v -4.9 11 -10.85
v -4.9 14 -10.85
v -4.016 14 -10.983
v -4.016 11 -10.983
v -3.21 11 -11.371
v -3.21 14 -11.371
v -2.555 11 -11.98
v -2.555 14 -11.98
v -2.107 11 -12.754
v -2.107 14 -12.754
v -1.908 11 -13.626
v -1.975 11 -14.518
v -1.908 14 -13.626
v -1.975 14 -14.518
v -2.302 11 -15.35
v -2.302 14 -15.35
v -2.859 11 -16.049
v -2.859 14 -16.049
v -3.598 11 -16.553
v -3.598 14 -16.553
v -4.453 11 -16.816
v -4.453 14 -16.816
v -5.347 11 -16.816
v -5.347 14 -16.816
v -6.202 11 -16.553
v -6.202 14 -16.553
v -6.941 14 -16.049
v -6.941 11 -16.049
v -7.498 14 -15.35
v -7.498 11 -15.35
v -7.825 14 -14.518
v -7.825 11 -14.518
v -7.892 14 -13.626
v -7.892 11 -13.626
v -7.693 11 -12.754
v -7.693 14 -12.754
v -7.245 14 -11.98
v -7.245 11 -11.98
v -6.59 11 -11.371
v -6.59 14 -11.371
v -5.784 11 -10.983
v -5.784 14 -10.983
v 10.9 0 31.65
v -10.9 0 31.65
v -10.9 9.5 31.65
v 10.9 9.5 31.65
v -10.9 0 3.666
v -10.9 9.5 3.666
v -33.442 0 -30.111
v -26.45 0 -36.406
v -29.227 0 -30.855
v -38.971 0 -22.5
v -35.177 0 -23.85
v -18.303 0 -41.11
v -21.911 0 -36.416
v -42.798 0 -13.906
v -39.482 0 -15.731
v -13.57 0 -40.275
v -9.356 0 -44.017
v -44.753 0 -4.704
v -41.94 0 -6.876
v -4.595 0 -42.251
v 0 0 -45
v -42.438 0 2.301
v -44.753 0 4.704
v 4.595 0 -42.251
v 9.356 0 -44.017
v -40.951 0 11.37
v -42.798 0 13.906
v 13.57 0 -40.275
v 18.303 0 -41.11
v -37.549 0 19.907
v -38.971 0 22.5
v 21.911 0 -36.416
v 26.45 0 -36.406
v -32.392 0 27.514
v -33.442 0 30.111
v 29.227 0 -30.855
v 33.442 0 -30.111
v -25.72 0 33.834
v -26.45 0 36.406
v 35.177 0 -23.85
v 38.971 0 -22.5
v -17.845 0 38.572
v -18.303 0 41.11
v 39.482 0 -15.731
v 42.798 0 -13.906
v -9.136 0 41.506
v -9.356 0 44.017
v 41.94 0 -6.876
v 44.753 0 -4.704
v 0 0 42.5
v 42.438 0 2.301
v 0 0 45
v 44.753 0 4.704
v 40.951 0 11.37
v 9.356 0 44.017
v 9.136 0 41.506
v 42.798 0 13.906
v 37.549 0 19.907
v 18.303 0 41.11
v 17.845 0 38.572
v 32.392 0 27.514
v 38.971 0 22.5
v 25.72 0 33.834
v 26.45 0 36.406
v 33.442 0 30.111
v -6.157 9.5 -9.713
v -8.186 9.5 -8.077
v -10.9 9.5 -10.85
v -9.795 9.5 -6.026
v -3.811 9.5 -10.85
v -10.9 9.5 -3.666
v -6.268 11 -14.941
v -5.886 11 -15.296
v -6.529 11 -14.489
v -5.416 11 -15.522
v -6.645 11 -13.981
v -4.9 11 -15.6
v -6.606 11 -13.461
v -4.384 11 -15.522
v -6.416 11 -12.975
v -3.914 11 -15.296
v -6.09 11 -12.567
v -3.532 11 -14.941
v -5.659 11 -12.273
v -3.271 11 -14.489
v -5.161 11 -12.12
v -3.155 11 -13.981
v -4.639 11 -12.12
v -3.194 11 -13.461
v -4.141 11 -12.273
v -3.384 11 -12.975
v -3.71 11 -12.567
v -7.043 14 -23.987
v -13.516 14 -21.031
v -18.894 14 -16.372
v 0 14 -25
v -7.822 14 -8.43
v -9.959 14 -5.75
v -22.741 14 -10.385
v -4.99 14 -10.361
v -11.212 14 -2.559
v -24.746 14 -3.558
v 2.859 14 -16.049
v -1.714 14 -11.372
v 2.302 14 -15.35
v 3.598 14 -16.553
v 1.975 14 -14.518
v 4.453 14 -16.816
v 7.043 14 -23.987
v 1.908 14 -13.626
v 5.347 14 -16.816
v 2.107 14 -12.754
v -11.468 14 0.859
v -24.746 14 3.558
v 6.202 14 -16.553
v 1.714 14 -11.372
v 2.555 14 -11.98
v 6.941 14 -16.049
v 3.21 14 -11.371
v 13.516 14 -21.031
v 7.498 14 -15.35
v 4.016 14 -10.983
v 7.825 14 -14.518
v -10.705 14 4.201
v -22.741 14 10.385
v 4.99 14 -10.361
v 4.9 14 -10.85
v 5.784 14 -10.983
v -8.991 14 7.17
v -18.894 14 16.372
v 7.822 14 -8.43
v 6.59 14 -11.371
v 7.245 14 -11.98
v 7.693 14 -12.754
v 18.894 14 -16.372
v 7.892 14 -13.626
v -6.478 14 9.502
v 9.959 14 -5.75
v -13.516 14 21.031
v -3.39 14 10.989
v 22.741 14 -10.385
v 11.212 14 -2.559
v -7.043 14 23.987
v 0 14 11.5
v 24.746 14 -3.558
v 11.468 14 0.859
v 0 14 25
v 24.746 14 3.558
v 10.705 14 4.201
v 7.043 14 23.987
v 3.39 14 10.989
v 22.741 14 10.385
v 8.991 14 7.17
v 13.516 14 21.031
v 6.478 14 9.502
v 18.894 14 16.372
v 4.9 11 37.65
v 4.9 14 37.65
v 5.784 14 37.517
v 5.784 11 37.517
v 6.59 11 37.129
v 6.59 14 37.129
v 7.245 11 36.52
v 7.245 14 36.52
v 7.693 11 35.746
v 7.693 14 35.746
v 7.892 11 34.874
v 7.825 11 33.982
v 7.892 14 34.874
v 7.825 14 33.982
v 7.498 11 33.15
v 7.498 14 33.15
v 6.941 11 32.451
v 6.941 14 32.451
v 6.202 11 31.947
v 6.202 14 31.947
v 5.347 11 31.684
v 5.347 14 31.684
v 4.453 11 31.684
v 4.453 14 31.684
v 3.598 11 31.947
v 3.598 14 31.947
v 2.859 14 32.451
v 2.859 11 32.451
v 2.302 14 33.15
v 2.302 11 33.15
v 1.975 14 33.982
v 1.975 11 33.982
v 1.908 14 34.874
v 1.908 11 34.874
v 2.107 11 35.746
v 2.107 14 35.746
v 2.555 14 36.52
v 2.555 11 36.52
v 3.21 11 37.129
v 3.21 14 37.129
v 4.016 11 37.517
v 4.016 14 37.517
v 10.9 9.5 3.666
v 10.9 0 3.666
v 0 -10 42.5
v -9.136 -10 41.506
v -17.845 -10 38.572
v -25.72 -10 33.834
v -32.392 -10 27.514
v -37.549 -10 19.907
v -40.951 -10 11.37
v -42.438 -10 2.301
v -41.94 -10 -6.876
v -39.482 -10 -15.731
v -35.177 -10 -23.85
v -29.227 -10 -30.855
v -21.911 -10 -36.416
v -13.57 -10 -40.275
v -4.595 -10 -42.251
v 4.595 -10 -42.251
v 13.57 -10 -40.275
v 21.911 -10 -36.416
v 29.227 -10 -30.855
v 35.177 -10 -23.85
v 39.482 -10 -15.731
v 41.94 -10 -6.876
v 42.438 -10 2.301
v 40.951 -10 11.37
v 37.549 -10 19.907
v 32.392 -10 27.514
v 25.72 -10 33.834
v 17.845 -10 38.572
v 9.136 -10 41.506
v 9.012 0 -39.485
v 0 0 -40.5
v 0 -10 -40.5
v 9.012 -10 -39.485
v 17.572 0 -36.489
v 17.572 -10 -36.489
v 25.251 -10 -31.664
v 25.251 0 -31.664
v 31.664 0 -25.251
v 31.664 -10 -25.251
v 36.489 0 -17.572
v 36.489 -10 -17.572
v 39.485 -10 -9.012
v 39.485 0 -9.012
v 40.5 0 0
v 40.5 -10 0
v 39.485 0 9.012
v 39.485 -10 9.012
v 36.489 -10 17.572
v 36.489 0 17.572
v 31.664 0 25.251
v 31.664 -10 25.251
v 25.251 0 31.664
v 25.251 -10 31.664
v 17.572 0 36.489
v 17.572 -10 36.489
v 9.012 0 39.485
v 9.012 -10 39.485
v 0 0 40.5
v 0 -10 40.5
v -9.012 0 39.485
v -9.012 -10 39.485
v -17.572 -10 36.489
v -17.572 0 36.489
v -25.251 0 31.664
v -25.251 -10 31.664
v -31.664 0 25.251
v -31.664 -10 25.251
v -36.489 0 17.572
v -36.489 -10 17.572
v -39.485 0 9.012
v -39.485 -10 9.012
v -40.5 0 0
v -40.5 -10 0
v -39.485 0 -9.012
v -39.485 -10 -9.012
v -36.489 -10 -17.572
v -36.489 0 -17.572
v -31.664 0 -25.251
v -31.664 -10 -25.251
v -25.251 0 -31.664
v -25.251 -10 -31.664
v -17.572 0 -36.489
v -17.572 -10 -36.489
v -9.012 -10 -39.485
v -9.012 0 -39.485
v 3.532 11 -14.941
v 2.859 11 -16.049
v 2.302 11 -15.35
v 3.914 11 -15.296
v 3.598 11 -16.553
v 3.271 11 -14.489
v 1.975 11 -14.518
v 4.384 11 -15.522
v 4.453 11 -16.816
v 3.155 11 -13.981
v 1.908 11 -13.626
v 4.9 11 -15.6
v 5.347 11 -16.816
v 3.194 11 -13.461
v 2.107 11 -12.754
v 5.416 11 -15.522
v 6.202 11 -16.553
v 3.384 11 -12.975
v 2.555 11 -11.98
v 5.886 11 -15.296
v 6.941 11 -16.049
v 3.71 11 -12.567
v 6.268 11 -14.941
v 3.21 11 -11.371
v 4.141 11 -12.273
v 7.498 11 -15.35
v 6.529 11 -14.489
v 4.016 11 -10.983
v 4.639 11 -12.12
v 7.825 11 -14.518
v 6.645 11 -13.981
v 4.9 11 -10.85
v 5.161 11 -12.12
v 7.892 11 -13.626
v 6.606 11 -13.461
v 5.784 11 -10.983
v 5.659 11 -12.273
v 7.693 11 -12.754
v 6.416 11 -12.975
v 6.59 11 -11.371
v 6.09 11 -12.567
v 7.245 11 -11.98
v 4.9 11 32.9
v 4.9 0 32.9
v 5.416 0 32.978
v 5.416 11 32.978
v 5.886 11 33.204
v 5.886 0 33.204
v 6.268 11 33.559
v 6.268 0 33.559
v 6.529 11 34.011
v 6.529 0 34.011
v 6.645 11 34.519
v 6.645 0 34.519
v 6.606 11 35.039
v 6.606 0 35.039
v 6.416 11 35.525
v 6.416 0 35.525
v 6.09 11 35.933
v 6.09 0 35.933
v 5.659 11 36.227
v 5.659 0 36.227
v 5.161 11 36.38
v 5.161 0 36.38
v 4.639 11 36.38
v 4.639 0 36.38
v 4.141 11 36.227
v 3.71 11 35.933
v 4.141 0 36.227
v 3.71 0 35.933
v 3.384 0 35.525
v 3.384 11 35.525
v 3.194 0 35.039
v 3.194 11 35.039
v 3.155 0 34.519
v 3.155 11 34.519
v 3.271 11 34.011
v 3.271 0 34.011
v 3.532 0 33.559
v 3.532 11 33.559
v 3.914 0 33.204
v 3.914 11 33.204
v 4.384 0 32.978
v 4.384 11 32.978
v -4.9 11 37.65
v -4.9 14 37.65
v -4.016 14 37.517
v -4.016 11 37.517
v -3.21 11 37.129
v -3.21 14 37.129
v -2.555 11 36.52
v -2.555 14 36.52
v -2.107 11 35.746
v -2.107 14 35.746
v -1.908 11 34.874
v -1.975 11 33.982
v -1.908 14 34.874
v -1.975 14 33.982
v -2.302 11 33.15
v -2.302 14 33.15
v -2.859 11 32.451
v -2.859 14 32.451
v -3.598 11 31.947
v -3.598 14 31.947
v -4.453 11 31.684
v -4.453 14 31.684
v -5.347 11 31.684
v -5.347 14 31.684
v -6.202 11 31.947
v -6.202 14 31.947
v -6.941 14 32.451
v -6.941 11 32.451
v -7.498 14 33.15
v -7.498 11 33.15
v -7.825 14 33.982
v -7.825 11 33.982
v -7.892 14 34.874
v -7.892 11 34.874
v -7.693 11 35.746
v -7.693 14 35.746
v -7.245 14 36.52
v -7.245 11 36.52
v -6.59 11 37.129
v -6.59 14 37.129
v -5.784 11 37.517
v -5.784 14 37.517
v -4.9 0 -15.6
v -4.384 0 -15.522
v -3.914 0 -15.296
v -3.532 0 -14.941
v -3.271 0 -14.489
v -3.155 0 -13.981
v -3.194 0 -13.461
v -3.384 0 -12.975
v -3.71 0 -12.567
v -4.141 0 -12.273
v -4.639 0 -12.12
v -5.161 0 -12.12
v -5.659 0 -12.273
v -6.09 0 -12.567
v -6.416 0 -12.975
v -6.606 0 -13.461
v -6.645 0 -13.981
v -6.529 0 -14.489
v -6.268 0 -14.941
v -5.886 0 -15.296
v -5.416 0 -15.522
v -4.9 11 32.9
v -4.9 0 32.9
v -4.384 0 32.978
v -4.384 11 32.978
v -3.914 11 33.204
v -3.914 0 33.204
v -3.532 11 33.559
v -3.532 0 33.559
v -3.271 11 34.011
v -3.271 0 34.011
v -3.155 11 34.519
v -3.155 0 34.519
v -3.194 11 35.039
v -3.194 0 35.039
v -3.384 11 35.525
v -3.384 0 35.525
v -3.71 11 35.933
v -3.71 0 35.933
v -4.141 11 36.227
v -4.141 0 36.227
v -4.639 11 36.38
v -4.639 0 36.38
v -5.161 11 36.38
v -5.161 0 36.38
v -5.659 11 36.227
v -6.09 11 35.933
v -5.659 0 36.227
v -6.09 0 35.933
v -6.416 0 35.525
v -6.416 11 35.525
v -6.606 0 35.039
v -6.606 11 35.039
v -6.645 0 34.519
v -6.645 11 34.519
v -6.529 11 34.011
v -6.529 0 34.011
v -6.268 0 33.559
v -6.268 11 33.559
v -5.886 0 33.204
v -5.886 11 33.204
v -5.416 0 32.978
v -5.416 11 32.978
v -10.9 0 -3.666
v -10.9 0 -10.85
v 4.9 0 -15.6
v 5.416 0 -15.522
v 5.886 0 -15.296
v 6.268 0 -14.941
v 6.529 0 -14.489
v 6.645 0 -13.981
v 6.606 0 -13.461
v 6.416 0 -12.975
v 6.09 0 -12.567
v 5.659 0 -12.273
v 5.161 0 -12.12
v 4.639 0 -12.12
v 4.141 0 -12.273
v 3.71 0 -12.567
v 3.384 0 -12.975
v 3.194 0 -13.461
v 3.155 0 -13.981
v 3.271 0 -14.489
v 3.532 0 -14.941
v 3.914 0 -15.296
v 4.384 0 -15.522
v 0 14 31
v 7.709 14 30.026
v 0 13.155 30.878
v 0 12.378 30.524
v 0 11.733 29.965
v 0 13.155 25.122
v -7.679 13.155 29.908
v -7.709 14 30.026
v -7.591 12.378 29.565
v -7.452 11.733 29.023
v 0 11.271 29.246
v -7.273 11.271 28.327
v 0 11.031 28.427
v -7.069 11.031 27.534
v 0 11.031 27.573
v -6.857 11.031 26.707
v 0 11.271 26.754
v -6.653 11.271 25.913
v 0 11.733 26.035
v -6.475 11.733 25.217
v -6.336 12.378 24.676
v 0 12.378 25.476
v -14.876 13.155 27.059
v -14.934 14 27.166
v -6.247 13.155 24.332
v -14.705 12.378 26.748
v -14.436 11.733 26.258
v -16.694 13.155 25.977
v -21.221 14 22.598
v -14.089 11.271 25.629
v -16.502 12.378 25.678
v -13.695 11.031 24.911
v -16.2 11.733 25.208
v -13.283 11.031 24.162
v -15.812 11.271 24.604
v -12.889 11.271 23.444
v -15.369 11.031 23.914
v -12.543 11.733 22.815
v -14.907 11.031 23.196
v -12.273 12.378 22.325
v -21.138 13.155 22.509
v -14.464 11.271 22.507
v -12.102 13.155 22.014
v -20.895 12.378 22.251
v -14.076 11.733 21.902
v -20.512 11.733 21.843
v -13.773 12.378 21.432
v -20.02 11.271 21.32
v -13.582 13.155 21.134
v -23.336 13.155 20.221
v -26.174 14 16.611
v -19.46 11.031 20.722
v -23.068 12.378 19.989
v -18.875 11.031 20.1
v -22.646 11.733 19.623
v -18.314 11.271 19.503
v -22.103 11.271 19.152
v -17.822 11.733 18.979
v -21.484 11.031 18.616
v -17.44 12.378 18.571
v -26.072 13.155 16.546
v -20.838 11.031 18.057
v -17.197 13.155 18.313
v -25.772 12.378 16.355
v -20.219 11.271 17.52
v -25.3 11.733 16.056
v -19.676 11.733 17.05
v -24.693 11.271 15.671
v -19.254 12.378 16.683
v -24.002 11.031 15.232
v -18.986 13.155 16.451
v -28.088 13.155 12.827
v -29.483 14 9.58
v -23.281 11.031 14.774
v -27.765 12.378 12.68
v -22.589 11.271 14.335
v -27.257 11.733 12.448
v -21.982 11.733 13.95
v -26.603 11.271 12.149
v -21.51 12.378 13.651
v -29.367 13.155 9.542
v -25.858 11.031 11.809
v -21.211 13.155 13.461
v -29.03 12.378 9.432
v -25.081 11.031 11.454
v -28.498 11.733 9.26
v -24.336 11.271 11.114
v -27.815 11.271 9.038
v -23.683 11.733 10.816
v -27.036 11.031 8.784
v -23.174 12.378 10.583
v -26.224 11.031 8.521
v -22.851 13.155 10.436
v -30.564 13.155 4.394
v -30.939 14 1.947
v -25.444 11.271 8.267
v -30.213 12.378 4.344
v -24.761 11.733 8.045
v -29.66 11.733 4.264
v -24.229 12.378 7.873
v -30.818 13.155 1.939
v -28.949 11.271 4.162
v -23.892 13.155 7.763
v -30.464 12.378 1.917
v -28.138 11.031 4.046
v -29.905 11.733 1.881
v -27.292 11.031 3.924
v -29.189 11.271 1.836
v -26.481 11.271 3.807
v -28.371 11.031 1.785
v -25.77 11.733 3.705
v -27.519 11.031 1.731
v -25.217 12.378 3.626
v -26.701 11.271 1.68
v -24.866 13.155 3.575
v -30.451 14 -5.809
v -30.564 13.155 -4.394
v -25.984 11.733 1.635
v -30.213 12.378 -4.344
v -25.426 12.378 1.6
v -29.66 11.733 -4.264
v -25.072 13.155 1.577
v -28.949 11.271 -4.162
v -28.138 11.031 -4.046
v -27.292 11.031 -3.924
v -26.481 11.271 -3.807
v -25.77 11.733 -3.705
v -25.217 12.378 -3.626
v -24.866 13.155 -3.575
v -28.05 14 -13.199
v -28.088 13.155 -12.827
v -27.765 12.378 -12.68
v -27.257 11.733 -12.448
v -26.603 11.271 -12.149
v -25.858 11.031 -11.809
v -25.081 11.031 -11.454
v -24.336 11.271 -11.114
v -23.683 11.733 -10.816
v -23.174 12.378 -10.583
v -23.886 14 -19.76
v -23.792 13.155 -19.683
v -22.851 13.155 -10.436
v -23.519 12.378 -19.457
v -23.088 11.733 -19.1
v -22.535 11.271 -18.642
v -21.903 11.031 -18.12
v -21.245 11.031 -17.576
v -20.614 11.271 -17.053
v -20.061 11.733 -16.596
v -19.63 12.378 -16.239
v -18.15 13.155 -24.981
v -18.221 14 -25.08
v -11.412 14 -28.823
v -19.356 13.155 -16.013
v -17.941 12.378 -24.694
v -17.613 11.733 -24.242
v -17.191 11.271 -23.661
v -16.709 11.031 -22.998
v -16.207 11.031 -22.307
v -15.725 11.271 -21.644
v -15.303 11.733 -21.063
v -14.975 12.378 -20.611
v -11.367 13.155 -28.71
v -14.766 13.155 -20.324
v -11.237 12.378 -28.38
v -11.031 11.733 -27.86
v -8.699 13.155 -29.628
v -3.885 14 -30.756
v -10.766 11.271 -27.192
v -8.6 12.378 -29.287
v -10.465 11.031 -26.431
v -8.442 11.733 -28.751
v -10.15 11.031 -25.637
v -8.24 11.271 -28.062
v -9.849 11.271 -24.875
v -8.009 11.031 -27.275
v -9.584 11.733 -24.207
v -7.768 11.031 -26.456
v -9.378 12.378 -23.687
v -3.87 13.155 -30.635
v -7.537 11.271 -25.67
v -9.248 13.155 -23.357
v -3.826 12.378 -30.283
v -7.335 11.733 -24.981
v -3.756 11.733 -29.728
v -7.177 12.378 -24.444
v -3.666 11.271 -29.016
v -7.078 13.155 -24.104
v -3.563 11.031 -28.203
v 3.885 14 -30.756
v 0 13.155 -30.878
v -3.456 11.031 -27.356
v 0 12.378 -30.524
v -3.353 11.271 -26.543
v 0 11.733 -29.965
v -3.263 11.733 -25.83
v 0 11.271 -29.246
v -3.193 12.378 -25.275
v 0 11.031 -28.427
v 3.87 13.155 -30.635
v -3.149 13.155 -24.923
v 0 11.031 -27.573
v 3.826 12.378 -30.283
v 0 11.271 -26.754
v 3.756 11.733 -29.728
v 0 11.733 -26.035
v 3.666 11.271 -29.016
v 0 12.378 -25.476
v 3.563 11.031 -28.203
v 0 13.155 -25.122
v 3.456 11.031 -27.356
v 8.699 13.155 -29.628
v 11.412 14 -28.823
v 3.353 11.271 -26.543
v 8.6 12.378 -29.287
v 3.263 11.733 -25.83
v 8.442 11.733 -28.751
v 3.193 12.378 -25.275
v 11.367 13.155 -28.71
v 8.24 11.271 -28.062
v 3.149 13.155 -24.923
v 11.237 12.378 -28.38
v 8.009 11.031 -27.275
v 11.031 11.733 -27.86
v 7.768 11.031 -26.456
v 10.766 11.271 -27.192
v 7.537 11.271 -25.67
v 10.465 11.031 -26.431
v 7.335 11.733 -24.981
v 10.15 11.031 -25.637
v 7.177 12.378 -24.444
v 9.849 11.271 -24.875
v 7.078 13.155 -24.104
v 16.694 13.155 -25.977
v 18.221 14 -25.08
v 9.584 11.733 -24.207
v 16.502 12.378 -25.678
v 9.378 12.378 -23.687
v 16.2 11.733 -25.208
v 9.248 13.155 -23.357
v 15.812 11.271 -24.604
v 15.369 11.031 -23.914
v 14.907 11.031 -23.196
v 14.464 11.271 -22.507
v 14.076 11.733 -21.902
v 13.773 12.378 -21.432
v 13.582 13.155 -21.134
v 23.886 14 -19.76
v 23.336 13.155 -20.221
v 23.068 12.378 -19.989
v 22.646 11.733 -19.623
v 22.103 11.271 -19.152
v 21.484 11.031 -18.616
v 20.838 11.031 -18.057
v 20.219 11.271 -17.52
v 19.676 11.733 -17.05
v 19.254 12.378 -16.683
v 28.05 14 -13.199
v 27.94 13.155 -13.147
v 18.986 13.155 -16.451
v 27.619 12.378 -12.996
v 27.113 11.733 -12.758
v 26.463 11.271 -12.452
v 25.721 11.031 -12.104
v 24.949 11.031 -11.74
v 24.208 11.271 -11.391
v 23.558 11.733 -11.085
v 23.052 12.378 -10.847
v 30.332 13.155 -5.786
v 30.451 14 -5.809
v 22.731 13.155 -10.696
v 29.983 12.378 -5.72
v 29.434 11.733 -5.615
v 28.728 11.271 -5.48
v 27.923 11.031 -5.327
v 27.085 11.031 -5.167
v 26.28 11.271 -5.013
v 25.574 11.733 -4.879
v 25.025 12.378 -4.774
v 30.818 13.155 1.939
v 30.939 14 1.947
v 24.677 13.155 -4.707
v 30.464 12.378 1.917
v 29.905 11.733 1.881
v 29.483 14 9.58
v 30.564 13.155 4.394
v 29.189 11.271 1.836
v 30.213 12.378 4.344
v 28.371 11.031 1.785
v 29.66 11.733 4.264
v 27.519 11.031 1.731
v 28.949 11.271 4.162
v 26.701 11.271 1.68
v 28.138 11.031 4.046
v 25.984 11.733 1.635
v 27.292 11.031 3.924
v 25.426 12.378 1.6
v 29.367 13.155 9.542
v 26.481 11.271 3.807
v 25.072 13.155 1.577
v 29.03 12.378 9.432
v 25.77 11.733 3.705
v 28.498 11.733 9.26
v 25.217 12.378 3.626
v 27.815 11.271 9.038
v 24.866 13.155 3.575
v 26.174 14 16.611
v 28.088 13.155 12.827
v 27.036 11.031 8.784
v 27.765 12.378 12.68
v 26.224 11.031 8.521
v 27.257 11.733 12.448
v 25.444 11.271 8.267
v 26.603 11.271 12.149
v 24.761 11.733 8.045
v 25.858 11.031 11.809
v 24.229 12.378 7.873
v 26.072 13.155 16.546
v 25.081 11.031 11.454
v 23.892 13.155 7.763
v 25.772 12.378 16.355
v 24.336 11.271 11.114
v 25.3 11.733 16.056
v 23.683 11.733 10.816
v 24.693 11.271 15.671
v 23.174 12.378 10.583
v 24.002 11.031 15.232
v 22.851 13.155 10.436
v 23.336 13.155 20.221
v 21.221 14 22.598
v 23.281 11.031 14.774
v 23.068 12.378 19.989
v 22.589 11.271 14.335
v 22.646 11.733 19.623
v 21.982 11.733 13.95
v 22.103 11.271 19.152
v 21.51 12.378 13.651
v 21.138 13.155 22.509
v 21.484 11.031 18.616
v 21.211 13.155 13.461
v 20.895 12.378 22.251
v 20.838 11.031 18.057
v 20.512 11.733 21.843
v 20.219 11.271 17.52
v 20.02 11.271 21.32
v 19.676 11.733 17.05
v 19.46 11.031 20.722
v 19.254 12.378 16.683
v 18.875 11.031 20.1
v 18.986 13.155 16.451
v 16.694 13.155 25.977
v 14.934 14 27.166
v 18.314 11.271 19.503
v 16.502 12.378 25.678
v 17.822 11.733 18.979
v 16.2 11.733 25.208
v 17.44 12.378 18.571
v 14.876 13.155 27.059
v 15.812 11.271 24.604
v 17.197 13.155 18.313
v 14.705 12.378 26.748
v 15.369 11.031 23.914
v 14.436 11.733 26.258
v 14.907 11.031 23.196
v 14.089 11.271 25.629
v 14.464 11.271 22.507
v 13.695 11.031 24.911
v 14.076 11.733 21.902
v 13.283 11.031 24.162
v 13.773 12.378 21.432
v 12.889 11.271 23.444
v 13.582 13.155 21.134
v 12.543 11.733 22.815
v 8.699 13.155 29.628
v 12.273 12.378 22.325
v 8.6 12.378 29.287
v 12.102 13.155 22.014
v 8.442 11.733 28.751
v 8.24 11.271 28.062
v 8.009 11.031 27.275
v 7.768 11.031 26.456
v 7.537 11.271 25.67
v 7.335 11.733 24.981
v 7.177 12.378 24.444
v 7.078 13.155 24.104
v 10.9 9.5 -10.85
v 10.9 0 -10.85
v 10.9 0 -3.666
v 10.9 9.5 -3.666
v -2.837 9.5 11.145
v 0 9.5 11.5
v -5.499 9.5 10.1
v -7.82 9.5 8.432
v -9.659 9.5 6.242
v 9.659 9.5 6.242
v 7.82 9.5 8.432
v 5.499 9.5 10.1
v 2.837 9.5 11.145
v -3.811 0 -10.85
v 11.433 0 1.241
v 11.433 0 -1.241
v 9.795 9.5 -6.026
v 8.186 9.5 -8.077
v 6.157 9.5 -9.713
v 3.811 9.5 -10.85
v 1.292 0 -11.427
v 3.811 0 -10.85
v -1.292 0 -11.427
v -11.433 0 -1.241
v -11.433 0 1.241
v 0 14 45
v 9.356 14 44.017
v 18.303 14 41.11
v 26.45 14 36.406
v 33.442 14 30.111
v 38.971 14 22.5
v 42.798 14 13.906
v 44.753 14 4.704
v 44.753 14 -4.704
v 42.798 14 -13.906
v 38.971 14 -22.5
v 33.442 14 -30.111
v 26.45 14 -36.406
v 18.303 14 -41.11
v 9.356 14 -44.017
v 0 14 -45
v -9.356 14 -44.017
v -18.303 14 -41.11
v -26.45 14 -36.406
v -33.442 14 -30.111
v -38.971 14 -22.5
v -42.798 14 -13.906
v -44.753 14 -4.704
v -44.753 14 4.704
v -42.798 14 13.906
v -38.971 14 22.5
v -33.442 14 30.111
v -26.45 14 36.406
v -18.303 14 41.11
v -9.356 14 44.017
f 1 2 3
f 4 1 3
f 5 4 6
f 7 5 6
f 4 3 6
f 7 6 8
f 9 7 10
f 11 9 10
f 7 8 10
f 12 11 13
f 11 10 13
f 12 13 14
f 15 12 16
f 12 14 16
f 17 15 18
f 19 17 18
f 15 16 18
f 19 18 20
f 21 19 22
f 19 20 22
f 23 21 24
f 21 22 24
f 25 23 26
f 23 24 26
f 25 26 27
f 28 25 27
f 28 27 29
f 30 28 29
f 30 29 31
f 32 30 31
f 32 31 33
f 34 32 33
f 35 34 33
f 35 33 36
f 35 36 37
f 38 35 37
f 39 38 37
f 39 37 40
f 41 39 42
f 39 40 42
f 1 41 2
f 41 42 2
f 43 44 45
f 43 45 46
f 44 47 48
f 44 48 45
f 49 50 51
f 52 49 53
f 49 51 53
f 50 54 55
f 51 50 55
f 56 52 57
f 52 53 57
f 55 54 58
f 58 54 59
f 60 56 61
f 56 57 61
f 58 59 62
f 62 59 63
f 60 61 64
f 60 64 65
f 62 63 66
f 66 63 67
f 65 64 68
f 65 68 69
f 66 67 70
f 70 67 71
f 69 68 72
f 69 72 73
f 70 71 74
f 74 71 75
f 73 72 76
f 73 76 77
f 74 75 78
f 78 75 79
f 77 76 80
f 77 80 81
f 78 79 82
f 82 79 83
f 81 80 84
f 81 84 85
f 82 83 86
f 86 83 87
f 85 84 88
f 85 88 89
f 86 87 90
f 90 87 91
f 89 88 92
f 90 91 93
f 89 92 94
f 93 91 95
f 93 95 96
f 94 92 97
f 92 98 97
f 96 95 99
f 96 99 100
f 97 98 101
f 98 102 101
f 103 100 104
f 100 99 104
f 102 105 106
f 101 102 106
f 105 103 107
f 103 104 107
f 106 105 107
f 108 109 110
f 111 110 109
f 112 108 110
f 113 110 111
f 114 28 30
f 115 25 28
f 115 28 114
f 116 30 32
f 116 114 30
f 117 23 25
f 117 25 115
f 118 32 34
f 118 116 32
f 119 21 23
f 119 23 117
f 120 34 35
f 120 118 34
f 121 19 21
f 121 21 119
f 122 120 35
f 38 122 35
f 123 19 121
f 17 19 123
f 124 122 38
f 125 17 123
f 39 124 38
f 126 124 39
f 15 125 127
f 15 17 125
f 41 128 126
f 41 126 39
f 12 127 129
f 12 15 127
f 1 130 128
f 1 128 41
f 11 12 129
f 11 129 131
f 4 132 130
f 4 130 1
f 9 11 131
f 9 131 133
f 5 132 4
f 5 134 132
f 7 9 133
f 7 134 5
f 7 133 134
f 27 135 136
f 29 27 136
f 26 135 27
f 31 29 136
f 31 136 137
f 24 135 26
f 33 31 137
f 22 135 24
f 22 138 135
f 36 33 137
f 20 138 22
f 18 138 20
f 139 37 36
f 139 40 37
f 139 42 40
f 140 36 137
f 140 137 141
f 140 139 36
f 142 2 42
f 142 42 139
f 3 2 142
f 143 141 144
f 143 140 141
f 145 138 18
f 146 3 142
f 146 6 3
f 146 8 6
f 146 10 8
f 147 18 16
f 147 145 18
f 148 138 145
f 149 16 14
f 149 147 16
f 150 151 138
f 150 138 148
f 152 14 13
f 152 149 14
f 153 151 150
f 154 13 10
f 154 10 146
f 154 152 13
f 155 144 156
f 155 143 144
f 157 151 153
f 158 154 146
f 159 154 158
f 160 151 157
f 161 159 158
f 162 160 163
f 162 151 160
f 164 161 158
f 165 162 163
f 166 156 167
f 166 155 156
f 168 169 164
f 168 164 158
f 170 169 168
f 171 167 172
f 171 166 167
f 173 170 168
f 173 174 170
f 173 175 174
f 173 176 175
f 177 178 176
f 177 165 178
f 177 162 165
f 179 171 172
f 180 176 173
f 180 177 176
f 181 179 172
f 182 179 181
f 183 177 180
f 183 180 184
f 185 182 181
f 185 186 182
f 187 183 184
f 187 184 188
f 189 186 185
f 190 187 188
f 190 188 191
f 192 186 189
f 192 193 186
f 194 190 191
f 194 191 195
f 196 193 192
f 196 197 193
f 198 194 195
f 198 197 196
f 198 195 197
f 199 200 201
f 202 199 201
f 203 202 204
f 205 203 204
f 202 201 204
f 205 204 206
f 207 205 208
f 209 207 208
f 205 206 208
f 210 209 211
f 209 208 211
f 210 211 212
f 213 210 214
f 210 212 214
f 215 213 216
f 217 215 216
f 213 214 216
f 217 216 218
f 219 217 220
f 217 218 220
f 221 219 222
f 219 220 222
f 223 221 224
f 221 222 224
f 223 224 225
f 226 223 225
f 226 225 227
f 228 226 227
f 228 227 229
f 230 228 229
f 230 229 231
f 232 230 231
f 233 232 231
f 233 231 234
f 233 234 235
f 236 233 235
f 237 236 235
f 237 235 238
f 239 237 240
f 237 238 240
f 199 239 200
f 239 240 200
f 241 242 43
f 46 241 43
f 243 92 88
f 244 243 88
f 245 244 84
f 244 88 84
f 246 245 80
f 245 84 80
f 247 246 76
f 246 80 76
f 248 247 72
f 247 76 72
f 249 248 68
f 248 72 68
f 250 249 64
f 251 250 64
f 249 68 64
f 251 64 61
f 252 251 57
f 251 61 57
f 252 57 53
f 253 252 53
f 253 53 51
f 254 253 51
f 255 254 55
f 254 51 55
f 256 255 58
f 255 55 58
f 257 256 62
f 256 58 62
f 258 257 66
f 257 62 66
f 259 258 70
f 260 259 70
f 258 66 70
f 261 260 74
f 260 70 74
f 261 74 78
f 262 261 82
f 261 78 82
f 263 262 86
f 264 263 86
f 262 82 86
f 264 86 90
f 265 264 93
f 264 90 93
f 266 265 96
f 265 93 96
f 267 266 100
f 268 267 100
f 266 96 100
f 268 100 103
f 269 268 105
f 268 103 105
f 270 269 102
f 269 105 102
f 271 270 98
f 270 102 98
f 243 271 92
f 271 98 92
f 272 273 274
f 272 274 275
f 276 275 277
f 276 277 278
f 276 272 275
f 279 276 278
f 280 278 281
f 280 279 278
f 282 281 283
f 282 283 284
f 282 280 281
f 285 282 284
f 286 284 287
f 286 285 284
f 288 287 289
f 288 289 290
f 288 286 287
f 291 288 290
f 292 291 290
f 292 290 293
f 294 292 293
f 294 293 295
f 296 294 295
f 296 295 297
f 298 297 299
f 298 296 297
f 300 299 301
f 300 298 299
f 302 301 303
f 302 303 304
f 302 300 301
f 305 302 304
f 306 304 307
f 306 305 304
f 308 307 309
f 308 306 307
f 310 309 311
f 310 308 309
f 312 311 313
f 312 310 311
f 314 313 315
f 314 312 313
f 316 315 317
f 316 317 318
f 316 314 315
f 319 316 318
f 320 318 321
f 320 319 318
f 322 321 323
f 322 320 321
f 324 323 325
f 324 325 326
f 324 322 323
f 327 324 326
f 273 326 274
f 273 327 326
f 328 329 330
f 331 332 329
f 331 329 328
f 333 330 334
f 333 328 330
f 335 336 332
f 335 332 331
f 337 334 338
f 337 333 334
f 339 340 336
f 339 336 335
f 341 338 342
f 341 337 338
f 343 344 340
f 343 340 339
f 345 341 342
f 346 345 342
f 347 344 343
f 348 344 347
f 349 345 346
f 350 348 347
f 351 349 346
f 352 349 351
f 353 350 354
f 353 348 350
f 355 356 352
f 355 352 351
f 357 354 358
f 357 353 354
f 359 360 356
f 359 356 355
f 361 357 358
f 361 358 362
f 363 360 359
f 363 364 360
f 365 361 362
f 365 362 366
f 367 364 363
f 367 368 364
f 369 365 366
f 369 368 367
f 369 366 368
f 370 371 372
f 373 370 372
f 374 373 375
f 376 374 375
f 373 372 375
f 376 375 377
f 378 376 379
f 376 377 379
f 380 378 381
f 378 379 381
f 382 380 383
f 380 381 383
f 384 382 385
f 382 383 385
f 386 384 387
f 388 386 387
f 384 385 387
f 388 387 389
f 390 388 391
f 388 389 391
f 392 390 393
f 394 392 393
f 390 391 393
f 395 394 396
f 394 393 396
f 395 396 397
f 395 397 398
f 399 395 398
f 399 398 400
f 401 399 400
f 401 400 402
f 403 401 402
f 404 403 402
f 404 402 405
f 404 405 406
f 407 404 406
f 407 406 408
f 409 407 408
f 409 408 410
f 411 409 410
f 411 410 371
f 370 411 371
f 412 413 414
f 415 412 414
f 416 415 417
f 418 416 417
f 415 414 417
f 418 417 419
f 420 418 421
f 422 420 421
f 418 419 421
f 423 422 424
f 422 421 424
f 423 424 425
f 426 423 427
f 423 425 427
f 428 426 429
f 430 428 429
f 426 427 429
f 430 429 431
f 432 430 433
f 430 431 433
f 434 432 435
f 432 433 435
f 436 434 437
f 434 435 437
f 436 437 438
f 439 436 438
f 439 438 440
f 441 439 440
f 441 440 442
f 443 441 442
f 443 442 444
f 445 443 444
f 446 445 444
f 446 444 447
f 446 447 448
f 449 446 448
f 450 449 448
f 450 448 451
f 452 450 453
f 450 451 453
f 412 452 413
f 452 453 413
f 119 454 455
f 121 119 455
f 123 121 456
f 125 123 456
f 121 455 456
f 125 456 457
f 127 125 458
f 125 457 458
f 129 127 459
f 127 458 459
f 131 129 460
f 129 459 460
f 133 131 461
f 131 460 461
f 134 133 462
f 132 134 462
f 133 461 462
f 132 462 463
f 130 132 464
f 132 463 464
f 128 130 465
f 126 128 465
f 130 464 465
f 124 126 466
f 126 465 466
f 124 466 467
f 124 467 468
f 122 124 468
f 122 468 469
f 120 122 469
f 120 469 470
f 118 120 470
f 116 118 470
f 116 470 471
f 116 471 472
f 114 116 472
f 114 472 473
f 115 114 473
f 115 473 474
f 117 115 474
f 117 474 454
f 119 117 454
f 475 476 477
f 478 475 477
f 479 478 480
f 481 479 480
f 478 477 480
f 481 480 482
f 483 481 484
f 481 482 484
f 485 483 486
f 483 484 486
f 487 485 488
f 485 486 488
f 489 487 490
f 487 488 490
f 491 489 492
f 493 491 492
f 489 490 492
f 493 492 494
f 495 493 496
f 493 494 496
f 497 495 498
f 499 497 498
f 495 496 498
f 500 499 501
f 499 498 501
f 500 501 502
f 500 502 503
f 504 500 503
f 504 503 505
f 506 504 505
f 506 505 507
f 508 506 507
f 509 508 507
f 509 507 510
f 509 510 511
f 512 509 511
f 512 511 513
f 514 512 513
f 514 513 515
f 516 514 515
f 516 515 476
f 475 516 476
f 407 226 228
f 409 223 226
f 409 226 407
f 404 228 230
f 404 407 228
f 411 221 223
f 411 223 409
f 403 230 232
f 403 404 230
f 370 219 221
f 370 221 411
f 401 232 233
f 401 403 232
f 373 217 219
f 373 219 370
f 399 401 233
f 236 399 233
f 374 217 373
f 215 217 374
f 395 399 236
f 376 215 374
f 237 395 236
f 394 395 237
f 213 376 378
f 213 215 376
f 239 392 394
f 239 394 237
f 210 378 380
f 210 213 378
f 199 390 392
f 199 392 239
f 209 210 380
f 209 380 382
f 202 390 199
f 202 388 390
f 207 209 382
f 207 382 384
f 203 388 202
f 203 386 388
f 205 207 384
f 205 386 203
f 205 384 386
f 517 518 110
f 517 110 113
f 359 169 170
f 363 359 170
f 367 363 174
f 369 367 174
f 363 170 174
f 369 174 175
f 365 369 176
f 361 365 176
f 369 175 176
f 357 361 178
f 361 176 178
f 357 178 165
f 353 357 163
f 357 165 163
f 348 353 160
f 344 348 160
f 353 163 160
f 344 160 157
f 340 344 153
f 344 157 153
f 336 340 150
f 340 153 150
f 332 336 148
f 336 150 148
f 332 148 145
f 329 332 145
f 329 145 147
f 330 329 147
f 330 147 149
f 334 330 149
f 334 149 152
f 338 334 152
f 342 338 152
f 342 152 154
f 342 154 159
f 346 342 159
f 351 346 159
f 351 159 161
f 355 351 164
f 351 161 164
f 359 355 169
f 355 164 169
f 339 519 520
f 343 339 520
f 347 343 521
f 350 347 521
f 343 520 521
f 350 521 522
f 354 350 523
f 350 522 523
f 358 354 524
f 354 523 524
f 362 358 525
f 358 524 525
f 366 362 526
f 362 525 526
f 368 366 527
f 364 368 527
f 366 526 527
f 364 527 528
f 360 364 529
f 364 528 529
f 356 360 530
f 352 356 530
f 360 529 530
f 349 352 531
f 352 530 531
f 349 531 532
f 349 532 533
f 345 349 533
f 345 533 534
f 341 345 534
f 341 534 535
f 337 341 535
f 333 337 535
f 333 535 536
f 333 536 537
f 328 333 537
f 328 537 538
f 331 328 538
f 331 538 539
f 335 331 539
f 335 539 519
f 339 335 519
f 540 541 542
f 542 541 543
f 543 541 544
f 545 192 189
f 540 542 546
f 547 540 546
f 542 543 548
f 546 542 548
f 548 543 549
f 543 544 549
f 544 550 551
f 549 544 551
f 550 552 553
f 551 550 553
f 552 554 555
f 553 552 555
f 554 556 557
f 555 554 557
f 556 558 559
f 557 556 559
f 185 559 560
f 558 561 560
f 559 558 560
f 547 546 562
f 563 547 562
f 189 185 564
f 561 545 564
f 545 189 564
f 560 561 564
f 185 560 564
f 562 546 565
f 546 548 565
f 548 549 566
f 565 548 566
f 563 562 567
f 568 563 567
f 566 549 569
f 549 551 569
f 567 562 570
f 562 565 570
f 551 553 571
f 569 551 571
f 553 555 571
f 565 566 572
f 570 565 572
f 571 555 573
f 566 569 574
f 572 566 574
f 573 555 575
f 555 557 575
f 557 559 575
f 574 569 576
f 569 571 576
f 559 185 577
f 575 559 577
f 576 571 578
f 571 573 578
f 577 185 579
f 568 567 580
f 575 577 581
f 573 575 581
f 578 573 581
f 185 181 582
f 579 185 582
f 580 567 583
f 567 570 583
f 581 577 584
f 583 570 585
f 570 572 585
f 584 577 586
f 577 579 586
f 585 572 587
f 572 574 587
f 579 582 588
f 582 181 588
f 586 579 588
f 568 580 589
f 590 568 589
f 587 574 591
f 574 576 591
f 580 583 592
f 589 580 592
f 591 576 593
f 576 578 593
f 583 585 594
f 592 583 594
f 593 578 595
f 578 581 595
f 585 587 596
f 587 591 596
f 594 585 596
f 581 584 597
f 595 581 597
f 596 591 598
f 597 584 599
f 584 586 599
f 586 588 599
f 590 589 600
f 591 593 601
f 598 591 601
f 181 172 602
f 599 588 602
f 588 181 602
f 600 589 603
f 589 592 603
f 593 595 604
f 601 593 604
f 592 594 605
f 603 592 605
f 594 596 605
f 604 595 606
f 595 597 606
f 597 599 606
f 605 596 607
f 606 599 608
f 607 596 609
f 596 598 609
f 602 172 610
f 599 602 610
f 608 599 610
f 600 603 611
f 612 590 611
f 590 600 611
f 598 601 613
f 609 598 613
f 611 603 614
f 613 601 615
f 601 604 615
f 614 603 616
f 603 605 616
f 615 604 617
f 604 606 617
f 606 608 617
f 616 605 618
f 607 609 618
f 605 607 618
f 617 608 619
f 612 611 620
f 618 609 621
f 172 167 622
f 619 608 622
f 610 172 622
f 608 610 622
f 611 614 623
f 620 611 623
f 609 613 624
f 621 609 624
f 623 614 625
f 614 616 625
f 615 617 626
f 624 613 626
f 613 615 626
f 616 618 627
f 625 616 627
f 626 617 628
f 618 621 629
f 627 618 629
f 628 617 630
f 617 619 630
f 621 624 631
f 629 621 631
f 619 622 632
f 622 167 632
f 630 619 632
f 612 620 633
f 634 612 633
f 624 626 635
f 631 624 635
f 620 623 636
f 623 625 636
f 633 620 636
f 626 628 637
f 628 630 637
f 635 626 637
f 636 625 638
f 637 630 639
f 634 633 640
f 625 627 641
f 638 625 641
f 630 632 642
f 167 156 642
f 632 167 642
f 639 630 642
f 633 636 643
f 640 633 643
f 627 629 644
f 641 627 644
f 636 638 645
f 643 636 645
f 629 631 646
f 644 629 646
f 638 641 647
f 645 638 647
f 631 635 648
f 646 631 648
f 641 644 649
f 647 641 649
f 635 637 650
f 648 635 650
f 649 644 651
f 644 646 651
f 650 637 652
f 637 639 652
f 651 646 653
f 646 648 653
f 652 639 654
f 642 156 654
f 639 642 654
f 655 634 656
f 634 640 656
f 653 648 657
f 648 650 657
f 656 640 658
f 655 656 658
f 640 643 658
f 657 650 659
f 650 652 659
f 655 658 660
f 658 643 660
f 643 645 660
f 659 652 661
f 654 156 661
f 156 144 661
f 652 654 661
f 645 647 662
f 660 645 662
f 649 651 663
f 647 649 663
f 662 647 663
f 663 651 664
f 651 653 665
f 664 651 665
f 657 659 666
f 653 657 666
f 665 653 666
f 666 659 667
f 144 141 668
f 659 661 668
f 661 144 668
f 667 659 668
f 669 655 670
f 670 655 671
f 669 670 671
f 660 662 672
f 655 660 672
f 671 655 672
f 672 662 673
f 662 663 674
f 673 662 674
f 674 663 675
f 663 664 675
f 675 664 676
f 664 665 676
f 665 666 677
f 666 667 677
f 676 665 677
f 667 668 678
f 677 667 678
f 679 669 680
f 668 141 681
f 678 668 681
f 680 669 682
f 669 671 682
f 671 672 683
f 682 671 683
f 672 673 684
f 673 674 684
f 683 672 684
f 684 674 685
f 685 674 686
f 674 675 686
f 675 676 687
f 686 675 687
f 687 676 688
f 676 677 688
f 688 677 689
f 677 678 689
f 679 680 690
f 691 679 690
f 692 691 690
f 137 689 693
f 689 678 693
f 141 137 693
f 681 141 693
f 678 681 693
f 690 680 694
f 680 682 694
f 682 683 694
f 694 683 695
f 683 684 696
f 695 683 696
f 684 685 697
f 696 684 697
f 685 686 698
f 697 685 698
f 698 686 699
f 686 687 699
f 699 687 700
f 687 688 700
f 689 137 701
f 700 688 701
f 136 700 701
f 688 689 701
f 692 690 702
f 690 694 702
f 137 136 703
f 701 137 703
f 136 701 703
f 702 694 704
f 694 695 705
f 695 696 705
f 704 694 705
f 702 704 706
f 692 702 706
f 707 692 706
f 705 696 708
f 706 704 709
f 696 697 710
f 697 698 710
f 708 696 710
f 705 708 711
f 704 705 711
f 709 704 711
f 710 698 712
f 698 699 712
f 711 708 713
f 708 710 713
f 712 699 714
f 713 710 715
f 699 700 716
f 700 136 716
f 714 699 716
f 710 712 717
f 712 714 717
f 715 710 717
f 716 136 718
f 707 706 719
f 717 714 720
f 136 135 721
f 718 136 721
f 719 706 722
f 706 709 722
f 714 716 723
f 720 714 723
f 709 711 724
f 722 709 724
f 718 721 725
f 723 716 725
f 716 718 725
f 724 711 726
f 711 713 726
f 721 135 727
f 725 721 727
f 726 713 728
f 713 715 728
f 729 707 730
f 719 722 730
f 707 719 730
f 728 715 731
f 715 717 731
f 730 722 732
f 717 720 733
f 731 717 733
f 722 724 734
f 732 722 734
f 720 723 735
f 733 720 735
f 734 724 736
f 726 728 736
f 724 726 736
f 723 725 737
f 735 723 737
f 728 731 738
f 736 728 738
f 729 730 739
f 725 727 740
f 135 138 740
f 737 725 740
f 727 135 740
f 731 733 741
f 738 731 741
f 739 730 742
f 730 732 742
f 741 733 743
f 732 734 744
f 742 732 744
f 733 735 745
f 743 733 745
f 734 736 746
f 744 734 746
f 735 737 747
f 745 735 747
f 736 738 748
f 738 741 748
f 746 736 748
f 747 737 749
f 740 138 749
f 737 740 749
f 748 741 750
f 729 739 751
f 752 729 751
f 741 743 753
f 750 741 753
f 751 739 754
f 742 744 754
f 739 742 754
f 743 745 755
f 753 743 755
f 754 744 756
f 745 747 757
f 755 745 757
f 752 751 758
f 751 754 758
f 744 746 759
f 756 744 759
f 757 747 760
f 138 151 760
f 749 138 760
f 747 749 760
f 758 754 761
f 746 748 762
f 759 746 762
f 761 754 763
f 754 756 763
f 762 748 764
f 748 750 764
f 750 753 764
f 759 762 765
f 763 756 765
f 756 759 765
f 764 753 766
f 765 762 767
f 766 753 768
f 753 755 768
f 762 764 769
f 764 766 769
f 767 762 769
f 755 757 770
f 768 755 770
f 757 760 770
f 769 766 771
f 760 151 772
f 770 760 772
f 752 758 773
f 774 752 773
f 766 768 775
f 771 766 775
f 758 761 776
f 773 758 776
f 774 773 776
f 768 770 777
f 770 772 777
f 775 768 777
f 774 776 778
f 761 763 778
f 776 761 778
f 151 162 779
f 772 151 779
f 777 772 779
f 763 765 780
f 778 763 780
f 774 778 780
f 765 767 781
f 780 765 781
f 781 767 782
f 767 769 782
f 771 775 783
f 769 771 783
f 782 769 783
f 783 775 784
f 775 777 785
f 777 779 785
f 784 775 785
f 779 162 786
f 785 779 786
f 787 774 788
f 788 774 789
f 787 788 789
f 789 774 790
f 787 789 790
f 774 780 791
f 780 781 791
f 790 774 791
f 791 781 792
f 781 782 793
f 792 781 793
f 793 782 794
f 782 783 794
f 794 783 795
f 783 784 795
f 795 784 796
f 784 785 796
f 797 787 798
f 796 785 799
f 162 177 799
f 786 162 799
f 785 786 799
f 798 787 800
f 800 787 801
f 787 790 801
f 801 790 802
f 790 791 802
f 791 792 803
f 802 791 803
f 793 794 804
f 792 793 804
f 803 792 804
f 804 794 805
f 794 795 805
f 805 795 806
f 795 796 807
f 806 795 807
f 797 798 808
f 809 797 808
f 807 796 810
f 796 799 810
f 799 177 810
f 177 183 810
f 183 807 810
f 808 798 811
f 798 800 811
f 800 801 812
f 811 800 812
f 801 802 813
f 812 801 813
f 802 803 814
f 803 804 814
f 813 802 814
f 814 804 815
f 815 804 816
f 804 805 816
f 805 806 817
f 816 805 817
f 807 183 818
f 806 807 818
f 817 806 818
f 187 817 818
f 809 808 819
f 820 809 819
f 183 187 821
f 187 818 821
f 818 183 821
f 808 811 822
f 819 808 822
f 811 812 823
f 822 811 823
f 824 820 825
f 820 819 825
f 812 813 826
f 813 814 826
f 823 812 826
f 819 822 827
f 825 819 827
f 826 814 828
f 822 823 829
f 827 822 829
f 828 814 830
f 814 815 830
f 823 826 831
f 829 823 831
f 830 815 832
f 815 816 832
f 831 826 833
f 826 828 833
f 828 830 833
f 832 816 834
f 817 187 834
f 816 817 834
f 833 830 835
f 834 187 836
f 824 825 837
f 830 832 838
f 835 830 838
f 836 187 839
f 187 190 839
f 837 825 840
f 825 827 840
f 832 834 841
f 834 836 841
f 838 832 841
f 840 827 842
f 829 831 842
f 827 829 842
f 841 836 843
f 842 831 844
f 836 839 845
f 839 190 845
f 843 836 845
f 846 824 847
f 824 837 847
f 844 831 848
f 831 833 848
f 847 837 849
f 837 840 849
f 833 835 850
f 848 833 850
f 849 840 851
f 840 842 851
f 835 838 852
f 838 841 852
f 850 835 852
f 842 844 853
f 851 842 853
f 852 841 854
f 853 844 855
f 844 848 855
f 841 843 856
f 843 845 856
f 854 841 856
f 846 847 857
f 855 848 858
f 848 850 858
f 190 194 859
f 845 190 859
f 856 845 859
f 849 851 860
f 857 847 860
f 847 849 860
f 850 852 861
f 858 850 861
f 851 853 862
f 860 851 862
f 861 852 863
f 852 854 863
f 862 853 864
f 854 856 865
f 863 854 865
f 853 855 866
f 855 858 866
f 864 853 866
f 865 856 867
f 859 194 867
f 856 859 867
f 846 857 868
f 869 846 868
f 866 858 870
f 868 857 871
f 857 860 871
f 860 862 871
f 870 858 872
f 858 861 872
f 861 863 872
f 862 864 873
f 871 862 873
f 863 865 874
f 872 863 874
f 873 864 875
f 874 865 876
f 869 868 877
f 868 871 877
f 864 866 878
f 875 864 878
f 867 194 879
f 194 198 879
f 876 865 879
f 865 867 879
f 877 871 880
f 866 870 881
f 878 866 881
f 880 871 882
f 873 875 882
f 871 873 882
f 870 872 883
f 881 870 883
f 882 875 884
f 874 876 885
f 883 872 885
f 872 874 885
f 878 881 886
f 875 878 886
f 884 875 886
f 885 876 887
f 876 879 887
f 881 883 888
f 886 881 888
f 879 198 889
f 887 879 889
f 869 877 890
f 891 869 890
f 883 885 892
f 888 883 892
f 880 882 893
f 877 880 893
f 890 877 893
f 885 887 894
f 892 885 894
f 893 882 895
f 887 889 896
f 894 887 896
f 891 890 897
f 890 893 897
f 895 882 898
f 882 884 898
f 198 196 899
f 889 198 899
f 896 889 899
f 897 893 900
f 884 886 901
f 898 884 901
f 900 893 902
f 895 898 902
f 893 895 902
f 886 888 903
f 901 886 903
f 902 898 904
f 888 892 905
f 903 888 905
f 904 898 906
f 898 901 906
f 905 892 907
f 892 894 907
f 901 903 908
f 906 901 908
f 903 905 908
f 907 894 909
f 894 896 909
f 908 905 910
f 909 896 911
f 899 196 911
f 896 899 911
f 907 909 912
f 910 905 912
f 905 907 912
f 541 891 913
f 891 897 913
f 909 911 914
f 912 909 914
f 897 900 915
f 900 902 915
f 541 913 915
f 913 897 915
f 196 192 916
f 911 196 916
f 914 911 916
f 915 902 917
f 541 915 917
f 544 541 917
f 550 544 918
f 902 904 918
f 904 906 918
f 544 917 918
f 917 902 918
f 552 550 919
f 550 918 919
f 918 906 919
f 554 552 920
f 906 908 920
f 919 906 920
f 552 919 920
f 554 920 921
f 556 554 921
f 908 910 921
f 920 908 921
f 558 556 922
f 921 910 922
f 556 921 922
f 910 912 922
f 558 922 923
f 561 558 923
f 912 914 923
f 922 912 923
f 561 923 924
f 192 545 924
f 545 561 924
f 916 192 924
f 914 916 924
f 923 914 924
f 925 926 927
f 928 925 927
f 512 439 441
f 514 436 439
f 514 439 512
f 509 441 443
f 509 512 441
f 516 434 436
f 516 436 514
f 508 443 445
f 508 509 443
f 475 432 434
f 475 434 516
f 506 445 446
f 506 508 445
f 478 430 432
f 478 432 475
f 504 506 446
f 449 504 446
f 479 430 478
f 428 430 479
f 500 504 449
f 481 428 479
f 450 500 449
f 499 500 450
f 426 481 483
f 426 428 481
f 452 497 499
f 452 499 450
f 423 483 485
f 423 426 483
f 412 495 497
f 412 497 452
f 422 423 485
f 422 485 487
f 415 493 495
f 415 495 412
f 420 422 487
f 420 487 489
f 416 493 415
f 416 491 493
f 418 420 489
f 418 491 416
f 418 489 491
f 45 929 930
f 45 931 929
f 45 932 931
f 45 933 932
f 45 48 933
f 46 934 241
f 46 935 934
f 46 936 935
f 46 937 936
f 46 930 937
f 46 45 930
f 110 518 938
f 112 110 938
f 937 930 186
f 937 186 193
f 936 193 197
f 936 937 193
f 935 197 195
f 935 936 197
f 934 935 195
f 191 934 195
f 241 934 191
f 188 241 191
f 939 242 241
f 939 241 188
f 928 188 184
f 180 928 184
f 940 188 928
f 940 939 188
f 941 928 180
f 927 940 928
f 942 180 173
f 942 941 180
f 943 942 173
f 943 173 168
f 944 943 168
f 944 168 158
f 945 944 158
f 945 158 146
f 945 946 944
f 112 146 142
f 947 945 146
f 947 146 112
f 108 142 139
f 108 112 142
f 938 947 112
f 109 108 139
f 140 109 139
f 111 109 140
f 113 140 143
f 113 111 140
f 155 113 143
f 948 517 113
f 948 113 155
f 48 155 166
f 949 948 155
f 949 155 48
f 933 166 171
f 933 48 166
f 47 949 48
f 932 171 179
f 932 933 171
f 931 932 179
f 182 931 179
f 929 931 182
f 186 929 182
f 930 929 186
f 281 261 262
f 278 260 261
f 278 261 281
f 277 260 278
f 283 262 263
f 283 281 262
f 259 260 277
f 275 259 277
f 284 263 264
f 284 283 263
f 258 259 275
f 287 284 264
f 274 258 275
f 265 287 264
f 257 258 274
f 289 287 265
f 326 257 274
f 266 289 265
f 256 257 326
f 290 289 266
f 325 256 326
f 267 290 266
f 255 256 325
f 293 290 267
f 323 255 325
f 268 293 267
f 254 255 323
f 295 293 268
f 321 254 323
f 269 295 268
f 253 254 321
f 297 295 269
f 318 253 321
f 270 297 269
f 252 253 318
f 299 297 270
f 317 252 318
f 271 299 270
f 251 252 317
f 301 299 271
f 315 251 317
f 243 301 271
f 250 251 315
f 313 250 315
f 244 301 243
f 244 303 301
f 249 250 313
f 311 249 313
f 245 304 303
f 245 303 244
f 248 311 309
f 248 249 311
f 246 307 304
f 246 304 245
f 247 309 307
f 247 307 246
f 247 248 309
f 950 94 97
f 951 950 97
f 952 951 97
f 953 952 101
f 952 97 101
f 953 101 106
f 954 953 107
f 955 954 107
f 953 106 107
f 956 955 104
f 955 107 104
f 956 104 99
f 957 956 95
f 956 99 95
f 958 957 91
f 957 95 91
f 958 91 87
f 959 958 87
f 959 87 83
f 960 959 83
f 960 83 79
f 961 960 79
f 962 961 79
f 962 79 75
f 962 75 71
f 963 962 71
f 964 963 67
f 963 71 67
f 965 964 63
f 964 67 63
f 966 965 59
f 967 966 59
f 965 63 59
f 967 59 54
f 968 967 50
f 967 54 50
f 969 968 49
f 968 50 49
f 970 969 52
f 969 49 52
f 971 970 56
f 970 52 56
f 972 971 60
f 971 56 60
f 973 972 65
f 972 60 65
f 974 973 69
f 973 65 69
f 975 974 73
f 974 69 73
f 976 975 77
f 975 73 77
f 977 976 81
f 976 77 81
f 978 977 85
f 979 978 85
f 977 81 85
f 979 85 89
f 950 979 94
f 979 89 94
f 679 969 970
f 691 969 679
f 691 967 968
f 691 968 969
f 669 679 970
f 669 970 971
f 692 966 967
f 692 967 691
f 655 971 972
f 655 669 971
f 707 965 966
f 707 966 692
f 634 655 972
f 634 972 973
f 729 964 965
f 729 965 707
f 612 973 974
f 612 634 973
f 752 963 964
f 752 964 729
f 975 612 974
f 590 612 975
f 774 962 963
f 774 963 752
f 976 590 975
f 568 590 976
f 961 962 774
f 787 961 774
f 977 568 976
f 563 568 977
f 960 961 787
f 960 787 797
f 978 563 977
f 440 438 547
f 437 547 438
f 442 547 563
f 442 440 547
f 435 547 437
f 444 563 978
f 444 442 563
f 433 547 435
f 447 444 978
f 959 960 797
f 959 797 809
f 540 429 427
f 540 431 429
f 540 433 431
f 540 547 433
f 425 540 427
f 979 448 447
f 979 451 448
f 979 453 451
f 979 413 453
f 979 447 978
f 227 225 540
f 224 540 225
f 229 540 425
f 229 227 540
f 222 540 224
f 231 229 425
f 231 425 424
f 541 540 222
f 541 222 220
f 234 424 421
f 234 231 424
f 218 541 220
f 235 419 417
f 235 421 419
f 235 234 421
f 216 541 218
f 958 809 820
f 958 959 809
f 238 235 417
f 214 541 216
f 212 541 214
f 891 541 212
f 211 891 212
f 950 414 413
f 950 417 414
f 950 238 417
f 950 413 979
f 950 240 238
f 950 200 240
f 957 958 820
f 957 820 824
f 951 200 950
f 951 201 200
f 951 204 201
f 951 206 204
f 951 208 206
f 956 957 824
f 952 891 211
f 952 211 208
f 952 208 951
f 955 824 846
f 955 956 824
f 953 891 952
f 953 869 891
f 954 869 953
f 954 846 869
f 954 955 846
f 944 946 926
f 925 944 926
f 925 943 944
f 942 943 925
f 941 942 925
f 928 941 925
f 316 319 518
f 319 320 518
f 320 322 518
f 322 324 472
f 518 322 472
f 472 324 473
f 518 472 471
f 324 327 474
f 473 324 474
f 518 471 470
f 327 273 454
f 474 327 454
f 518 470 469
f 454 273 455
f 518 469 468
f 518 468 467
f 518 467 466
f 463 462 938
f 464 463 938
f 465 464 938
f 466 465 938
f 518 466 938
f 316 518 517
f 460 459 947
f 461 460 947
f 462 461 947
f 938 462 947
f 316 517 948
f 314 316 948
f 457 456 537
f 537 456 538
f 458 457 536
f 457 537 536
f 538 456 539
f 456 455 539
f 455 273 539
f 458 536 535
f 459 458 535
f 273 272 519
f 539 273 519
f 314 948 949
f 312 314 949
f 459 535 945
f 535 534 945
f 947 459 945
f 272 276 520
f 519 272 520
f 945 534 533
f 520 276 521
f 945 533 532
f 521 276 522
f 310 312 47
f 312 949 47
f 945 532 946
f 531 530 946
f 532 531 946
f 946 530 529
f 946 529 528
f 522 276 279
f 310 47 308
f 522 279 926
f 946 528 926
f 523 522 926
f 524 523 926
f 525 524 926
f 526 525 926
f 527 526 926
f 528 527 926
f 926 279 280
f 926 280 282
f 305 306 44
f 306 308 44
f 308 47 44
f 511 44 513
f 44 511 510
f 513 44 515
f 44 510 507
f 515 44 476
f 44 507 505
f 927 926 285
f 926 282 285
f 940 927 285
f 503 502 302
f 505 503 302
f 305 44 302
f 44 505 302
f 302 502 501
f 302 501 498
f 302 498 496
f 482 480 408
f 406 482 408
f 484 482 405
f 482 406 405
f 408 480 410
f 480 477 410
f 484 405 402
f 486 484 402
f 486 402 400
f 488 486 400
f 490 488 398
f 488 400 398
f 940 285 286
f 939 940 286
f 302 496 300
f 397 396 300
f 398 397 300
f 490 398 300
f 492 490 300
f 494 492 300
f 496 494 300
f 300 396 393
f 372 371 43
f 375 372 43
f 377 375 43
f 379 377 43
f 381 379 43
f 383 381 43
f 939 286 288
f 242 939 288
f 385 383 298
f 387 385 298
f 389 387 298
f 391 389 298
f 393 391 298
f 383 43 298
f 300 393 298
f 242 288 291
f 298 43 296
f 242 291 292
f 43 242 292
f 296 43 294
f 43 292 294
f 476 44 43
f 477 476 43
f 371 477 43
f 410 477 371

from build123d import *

# Parameters (mm, degrees)
SKETCH1_R           = 45
SKETCH1_R_2         = 11.5
BOSS_EXTRUDE1_DEPTH = 14
SKETCH3_R           = 3
SKETCH6_R           = 3
CUT_EXTRUDE3_DEPTH  = 3
SKETCH7_R           = 1.75
CUT_EXTRUDE4_DEPTH  = 13
SKETCH8_W           = 21.8
SKETCH8_H           = 42.5
CUT_EXTRUDE7_DEPTH  = 9.5
SKETCH9_R           = 42.5
SKETCH9_R_2         = 40.5
BOSS_EXTRUDE2_DEPTH = 10


with BuildPart() as part:
    # Sketch1 → Boss-Extrude1 (new body)
    with BuildSketch(Plane(origin=(0, 0, 0), x_dir=(1, 0, 0), z_dir=(0, 1, 0))):
        with Locations(Location((0, 0, 0), (0, 0, 270))):
            Circle(SKETCH1_R)
        with Locations(Location((0, 0, 0), (0, 0, 270))):
            Circle(SKETCH1_R_2, mode=Mode.SUBTRACT)
    extrude(amount=BOSS_EXTRUDE1_DEPTH)

    # Sketch3 → Cut-Revolve1 (revolve, cut)
    with BuildSketch(Plane.XY, mode=Mode.PRIVATE) as cut_revolve1_sk:
        with Locations((-28, 14)):
            Circle(SKETCH3_R)
    revolve(cut_revolve1_sk.sketch.rotate(Axis((0, 14, 0), (0, -1, 0)), 270), axis=Axis((0, 14, 0), (0, -1, 0)), mode=Mode.SUBTRACT)

    # Sketch6 → Cut-Extrude3 (cut)
    with BuildSketch(Plane(origin=(0, 14, 0), x_dir=(1, 0, 0), z_dir=(0, 1, 0))):
        with Locations(Location((-4.9, -34.65, 0), (0, 0, 270))):
            Circle(SKETCH6_R)
        with Locations(Location((4.9, -34.65, 0), (0, 0, 270))):
            Circle(SKETCH6_R)
        with Locations(Location((-4.9, 13.85, 0), (0, 0, 270))):
            Circle(SKETCH6_R)
        with Locations(Location((4.9, 13.85, 0), (0, 0, 270))):
            Circle(SKETCH6_R)
    extrude(amount=-CUT_EXTRUDE3_DEPTH, mode=Mode.SUBTRACT)

    # Sketch7 → Cut-Extrude4 (cut)
    with BuildSketch(Plane.XZ):
        with Locations(Location((4.9, 34.65, 0), (0, 0, 270))):
            Circle(SKETCH7_R)
        with Locations(Location((-4.9, 34.65, 0), (0, 0, 270))):
            Circle(SKETCH7_R)
        with Locations(Location((4.9, -13.85, 0), (0, 0, 270))):
            Circle(SKETCH7_R)
        with Locations(Location((-4.9, -13.85, 0), (0, 0, 270))):
            Circle(SKETCH7_R)
    extrude(amount=-CUT_EXTRUDE4_DEPTH, mode=Mode.SUBTRACT)

    # Sketch8 → Cut-Extrude7 (cut)
    with BuildSketch(Plane.XZ):
        with Locations((0, 10.4)):
            Rectangle(SKETCH8_W, SKETCH8_H)
    extrude(amount=-CUT_EXTRUDE7_DEPTH, mode=Mode.SUBTRACT)

    # Sketch9 → Boss-Extrude2 (add)
    with BuildSketch(Plane.XZ):
        with Locations(Location((0, 0, 0), (0, 0, 90))):
            Circle(SKETCH9_R)
        with Locations(Location((0, 0, 0), (0, 0, 270))):
            Circle(SKETCH9_R_2, mode=Mode.SUBTRACT)
    extrude(amount=BOSS_EXTRUDE2_DEPTH)


solid = part.part
